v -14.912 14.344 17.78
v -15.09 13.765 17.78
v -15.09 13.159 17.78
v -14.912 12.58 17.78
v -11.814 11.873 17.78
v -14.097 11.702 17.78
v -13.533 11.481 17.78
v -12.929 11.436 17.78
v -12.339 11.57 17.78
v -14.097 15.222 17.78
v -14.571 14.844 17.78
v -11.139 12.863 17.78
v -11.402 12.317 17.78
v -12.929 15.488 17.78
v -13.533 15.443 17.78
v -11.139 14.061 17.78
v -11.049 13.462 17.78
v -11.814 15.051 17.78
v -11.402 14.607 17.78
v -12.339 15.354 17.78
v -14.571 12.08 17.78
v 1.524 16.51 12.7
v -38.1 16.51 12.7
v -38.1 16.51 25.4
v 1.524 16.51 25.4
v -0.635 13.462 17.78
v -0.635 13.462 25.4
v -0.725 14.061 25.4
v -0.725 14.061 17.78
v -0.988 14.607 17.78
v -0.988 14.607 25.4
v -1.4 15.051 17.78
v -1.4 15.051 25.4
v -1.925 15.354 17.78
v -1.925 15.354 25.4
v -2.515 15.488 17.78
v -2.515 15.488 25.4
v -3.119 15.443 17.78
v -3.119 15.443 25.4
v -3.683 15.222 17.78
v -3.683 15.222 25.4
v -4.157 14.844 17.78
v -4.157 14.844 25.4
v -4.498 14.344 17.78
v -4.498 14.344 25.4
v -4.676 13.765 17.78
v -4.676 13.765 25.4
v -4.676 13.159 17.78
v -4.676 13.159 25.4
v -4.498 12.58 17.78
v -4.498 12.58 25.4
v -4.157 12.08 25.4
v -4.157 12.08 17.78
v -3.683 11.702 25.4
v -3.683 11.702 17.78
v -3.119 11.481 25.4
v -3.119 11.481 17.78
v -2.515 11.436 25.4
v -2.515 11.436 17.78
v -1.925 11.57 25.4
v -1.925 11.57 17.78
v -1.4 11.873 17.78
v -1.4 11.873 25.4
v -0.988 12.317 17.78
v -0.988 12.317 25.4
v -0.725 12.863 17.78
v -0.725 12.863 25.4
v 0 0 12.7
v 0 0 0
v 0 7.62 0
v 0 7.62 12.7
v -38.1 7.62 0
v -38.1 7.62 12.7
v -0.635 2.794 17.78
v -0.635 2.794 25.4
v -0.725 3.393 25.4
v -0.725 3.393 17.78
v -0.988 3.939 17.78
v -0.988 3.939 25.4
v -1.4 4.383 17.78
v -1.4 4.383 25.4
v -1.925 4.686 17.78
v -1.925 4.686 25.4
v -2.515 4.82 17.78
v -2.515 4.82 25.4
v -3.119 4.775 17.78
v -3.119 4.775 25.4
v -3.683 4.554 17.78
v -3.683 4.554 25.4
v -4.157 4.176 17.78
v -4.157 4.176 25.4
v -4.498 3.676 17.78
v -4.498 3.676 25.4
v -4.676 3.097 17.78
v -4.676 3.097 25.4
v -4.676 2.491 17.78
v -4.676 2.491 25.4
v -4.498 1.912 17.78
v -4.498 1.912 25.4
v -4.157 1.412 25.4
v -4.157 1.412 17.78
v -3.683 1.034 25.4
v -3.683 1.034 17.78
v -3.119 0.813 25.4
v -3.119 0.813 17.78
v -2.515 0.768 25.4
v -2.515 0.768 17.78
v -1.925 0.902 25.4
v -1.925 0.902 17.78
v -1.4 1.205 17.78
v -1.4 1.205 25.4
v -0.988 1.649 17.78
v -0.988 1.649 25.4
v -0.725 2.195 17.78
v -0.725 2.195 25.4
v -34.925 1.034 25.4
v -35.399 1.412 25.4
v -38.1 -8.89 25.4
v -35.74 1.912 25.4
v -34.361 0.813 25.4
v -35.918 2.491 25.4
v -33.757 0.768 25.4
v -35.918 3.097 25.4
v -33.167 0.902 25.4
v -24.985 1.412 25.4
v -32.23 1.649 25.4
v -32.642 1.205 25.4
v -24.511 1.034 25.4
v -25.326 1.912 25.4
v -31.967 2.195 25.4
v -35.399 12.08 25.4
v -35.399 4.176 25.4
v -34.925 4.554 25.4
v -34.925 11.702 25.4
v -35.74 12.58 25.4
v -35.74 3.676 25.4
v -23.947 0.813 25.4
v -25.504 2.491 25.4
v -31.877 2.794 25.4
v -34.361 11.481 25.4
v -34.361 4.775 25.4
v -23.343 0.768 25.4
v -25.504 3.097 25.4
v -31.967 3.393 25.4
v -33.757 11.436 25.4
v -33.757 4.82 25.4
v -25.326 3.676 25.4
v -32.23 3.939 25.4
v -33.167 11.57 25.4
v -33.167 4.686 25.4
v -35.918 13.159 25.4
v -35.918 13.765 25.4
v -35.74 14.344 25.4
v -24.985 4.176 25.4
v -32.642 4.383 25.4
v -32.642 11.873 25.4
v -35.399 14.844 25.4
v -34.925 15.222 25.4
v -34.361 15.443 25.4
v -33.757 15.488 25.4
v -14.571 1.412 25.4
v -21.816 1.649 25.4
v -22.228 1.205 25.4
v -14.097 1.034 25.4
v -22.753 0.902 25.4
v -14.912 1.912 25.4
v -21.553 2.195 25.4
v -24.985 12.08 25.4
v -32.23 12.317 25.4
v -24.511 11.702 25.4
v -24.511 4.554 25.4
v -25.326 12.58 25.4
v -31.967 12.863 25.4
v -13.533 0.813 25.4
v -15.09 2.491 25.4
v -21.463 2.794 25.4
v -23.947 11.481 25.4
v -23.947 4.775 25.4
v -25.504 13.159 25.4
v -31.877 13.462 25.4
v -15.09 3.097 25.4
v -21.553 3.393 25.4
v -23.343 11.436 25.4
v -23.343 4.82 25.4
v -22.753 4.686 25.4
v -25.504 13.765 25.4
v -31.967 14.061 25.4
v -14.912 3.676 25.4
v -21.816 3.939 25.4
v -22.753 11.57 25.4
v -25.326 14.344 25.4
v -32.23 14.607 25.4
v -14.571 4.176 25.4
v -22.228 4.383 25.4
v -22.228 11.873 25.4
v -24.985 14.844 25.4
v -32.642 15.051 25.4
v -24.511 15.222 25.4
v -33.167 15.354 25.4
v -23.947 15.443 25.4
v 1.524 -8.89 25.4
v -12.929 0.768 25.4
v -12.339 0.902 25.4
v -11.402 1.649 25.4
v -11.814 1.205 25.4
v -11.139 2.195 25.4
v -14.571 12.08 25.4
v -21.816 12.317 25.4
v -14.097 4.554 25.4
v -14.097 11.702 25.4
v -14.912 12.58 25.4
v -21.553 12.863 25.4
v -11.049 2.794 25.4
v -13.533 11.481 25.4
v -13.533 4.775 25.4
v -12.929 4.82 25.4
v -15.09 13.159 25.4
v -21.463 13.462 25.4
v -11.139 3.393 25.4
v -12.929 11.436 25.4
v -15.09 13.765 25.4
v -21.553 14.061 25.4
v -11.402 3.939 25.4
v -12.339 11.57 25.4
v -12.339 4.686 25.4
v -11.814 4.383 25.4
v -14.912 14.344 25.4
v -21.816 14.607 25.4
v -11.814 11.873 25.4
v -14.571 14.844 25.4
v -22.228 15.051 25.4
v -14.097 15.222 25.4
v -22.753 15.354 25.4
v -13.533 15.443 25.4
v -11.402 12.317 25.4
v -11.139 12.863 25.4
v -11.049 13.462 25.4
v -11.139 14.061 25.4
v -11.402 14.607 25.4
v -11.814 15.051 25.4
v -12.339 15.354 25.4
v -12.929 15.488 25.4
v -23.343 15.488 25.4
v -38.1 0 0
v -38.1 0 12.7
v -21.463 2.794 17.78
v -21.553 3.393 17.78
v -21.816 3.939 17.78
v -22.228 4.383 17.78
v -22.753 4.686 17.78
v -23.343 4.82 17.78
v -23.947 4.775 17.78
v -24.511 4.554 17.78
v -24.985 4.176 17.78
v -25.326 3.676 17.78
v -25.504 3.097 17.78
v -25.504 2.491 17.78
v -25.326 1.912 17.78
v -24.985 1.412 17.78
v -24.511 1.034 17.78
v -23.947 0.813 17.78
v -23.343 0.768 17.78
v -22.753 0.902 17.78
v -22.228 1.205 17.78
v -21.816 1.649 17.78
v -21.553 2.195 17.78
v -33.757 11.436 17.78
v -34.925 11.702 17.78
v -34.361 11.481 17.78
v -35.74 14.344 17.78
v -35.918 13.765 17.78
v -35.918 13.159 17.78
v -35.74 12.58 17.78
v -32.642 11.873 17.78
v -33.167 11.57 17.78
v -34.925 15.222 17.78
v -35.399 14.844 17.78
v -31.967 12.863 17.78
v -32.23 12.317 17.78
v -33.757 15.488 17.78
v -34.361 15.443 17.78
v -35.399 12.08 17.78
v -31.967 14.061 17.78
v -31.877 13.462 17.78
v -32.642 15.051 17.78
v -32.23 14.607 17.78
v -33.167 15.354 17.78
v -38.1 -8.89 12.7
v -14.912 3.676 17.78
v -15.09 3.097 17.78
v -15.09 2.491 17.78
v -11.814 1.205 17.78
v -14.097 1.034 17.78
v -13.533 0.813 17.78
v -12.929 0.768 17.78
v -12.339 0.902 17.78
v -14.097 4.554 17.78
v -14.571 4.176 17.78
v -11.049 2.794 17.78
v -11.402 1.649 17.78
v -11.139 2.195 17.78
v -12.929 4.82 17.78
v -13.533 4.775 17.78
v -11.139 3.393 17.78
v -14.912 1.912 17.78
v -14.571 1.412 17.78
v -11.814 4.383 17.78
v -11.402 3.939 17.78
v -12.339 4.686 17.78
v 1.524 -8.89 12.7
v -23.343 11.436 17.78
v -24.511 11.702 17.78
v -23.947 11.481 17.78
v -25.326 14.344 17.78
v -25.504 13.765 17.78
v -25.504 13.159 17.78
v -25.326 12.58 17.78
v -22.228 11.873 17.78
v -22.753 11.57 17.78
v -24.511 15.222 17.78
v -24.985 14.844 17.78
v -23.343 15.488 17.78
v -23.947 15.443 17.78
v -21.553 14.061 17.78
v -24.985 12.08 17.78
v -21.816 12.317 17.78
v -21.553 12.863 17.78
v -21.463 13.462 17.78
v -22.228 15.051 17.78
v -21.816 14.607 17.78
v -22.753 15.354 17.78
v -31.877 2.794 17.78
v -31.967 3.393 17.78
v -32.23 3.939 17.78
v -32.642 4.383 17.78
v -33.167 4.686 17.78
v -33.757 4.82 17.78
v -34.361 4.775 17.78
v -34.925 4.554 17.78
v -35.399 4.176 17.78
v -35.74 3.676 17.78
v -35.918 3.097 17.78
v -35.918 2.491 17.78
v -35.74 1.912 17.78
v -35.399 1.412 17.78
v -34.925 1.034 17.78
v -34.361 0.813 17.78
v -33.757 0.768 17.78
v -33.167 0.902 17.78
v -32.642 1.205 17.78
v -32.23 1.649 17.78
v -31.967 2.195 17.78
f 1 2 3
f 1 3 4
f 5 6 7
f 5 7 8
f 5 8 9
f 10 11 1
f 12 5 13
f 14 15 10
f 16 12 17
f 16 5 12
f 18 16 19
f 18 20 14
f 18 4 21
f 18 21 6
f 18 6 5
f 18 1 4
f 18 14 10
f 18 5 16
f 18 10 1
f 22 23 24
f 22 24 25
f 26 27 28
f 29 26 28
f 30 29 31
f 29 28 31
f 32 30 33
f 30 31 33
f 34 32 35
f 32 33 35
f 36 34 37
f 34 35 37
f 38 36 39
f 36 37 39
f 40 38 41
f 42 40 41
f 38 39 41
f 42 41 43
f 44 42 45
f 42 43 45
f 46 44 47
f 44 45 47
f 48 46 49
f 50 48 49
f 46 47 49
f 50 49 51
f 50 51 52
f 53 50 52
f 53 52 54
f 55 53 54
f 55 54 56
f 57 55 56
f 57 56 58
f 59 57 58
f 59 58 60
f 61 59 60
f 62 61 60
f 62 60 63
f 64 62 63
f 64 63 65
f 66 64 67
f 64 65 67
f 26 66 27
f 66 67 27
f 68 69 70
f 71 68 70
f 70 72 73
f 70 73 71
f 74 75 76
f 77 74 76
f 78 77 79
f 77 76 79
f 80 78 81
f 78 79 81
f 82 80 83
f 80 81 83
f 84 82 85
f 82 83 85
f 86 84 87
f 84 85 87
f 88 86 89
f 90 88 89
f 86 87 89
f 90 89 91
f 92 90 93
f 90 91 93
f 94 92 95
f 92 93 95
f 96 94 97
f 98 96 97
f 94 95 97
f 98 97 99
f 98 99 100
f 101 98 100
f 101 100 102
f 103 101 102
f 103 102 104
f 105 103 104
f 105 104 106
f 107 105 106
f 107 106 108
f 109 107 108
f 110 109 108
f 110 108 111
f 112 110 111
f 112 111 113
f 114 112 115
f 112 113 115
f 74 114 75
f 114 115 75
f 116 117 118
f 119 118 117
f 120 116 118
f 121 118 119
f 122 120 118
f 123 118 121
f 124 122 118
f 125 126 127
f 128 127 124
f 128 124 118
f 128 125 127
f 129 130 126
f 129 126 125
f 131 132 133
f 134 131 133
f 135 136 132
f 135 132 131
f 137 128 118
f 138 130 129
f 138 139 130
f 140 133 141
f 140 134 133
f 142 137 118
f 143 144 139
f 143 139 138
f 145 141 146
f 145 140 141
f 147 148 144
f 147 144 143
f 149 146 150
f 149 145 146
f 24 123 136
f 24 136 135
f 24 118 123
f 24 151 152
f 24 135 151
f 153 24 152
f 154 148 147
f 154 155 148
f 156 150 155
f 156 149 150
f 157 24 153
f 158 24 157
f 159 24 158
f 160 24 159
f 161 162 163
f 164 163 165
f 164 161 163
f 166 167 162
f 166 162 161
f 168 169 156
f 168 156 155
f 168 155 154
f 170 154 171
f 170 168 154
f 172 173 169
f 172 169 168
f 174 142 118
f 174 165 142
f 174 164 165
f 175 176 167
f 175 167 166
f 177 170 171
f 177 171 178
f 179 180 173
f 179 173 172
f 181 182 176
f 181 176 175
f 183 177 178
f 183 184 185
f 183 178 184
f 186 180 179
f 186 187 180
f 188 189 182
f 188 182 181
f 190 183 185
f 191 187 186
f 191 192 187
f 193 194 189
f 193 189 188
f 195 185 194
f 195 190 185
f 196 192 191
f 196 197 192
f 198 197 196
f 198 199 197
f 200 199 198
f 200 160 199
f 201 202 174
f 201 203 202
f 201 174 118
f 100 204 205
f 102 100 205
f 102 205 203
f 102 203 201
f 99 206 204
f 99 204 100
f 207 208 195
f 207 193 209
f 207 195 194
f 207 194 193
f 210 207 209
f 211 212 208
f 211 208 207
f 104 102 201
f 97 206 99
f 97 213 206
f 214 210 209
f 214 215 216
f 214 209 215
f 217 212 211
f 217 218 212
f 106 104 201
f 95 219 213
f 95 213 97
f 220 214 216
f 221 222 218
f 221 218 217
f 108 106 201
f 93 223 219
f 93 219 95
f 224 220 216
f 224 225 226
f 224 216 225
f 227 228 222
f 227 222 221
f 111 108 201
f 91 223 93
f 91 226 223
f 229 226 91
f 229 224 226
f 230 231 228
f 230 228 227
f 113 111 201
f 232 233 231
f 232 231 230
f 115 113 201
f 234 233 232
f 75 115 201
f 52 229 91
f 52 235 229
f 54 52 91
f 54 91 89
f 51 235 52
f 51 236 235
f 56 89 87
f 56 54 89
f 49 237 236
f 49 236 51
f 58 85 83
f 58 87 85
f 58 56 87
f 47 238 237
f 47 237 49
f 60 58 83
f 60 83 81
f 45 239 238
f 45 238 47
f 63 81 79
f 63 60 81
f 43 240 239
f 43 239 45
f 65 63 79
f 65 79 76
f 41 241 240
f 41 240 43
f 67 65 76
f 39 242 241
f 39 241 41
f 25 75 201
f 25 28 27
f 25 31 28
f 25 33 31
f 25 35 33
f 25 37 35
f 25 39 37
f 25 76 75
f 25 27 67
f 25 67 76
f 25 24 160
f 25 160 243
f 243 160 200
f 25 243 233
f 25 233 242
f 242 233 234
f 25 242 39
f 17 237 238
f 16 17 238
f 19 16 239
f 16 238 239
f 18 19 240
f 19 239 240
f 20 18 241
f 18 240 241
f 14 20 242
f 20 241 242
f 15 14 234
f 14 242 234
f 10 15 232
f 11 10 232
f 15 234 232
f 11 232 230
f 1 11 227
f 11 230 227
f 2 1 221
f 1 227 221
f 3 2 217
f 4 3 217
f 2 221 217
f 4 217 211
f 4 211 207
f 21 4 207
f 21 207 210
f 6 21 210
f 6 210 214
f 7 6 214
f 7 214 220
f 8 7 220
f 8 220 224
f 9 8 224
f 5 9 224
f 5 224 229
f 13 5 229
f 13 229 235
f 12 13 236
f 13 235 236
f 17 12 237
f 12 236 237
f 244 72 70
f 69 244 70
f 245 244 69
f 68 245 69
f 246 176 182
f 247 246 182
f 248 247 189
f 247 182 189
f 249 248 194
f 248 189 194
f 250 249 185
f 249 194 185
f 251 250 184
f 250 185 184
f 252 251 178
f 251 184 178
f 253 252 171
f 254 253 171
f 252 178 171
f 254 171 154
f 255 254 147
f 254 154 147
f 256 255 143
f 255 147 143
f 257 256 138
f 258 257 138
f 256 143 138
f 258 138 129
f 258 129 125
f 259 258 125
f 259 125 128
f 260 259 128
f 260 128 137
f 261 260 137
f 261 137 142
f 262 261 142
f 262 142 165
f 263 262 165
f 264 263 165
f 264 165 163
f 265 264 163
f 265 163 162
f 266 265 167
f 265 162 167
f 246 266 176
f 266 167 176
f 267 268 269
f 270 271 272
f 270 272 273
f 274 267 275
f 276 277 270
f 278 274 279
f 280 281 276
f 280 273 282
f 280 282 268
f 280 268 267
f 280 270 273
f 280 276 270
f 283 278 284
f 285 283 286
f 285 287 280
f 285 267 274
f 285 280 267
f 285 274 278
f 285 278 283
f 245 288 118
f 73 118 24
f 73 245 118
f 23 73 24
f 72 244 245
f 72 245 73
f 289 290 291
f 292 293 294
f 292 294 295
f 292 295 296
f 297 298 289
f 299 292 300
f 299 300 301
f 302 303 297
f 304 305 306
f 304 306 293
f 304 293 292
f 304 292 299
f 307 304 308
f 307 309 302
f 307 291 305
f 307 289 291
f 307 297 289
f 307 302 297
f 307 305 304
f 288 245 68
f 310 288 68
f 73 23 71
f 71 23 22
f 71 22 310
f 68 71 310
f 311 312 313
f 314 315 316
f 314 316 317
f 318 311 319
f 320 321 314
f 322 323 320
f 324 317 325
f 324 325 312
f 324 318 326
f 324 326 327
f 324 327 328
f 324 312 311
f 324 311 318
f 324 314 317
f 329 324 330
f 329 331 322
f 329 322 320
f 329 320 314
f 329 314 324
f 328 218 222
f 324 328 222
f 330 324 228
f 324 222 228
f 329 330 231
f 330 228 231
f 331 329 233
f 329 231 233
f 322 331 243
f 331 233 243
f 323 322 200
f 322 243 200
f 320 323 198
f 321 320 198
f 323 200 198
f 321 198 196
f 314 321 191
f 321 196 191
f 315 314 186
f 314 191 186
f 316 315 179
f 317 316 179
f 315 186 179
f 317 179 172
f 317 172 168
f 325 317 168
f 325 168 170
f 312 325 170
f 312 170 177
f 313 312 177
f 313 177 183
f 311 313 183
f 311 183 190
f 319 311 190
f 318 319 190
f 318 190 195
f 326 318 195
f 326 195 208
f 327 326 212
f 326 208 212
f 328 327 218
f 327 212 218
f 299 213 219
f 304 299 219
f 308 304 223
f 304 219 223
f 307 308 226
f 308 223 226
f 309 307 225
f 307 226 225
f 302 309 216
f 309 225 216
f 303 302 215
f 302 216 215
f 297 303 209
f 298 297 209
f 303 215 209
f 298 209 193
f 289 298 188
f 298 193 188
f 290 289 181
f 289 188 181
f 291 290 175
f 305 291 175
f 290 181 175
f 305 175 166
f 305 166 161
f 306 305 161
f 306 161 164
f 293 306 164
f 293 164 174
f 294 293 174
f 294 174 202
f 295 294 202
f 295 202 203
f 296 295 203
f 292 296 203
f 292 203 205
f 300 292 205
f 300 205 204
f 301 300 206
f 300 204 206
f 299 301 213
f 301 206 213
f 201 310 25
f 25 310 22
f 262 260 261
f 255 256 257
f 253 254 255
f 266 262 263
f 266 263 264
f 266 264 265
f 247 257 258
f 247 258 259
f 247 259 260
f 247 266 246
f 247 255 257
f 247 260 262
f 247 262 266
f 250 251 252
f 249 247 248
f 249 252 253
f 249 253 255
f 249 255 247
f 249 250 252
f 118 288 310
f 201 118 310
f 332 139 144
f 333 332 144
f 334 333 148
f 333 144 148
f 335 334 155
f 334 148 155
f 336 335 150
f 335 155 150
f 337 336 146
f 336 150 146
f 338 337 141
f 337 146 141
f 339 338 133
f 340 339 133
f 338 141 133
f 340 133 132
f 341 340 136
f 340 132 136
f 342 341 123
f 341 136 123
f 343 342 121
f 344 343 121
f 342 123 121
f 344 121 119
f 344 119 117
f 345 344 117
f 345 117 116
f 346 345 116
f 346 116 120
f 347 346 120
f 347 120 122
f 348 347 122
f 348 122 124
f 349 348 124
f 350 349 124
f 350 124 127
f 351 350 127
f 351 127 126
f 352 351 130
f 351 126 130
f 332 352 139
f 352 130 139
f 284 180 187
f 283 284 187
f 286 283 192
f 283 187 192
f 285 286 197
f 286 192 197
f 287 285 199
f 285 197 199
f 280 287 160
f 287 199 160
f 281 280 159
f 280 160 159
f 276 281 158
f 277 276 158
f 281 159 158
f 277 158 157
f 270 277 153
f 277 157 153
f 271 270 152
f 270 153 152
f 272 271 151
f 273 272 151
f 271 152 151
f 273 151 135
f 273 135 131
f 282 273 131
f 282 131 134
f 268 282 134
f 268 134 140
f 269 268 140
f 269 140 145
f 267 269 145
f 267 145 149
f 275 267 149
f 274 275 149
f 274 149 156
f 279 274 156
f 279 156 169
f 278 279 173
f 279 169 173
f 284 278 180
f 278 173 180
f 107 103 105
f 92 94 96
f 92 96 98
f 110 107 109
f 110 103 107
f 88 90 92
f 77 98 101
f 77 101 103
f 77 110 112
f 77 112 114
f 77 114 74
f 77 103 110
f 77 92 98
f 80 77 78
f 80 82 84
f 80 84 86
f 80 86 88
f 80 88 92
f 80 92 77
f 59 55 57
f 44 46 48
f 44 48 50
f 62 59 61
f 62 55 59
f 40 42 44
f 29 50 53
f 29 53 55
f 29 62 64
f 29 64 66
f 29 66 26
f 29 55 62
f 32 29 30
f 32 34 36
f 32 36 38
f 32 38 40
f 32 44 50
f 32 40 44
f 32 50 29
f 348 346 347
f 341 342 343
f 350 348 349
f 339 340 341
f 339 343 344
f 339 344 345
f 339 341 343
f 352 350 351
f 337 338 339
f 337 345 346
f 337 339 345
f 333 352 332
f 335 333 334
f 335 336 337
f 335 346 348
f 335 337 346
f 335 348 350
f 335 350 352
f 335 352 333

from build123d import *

# Parameters (mm, degrees)
SKETCH1_W           = 38.1
SKETCH1_H           = 7.62
BOSS_EXTRUDE1_DEPTH = 12.7
SKETCH2_W           = 39.624
SKETCH2_H           = 25.4
BOSS_EXTRUDE2_DEPTH = 12.7
SKETCH3_R           = 2.032
CUT_EXTRUDE1_DEPTH  = 7.62


with BuildPart() as part:
    # Sketch1 → Boss-Extrude1 (new body)
    with BuildSketch(Plane.XY):
        with Locations((-19.05, 3.81)):
            Rectangle(SKETCH1_W, SKETCH1_H)
    extrude(amount=BOSS_EXTRUDE1_DEPTH)

    # Sketch2 → Boss-Extrude2 (add)
    with BuildSketch(Plane.XY.offset(12.7)):
        with Locations((-18.288, 3.81)):
            Rectangle(SKETCH2_W, SKETCH2_H)
    extrude(amount=BOSS_EXTRUDE2_DEPTH)

    # Sketch3 → Cut-Extrude1 (cut)
    with BuildSketch(Plane.XY.offset(25.4)):
        with Locations((-33.909, 13.462)):
            Circle(SKETCH3_R)
        with Locations((-23.495, 13.462)):
            Circle(SKETCH3_R)
        with Locations((-2.667, 13.462)):
            Circle(SKETCH3_R)
        with Locations((-13.081, 2.794)):
            Circle(SKETCH3_R)
        with Locations((-23.495, 2.794)):
            Circle(SKETCH3_R)
        with Locations((-33.909, 2.794)):
            Circle(SKETCH3_R)
        with Locations((-13.081, 13.462)):
            Circle(SKETCH3_R)
        with Locations((-2.667, 2.794)):
            Circle(SKETCH3_R)
    extrude(amount=-CUT_EXTRUDE1_DEPTH, mode=Mode.SUBTRACT)


solid = part.part
